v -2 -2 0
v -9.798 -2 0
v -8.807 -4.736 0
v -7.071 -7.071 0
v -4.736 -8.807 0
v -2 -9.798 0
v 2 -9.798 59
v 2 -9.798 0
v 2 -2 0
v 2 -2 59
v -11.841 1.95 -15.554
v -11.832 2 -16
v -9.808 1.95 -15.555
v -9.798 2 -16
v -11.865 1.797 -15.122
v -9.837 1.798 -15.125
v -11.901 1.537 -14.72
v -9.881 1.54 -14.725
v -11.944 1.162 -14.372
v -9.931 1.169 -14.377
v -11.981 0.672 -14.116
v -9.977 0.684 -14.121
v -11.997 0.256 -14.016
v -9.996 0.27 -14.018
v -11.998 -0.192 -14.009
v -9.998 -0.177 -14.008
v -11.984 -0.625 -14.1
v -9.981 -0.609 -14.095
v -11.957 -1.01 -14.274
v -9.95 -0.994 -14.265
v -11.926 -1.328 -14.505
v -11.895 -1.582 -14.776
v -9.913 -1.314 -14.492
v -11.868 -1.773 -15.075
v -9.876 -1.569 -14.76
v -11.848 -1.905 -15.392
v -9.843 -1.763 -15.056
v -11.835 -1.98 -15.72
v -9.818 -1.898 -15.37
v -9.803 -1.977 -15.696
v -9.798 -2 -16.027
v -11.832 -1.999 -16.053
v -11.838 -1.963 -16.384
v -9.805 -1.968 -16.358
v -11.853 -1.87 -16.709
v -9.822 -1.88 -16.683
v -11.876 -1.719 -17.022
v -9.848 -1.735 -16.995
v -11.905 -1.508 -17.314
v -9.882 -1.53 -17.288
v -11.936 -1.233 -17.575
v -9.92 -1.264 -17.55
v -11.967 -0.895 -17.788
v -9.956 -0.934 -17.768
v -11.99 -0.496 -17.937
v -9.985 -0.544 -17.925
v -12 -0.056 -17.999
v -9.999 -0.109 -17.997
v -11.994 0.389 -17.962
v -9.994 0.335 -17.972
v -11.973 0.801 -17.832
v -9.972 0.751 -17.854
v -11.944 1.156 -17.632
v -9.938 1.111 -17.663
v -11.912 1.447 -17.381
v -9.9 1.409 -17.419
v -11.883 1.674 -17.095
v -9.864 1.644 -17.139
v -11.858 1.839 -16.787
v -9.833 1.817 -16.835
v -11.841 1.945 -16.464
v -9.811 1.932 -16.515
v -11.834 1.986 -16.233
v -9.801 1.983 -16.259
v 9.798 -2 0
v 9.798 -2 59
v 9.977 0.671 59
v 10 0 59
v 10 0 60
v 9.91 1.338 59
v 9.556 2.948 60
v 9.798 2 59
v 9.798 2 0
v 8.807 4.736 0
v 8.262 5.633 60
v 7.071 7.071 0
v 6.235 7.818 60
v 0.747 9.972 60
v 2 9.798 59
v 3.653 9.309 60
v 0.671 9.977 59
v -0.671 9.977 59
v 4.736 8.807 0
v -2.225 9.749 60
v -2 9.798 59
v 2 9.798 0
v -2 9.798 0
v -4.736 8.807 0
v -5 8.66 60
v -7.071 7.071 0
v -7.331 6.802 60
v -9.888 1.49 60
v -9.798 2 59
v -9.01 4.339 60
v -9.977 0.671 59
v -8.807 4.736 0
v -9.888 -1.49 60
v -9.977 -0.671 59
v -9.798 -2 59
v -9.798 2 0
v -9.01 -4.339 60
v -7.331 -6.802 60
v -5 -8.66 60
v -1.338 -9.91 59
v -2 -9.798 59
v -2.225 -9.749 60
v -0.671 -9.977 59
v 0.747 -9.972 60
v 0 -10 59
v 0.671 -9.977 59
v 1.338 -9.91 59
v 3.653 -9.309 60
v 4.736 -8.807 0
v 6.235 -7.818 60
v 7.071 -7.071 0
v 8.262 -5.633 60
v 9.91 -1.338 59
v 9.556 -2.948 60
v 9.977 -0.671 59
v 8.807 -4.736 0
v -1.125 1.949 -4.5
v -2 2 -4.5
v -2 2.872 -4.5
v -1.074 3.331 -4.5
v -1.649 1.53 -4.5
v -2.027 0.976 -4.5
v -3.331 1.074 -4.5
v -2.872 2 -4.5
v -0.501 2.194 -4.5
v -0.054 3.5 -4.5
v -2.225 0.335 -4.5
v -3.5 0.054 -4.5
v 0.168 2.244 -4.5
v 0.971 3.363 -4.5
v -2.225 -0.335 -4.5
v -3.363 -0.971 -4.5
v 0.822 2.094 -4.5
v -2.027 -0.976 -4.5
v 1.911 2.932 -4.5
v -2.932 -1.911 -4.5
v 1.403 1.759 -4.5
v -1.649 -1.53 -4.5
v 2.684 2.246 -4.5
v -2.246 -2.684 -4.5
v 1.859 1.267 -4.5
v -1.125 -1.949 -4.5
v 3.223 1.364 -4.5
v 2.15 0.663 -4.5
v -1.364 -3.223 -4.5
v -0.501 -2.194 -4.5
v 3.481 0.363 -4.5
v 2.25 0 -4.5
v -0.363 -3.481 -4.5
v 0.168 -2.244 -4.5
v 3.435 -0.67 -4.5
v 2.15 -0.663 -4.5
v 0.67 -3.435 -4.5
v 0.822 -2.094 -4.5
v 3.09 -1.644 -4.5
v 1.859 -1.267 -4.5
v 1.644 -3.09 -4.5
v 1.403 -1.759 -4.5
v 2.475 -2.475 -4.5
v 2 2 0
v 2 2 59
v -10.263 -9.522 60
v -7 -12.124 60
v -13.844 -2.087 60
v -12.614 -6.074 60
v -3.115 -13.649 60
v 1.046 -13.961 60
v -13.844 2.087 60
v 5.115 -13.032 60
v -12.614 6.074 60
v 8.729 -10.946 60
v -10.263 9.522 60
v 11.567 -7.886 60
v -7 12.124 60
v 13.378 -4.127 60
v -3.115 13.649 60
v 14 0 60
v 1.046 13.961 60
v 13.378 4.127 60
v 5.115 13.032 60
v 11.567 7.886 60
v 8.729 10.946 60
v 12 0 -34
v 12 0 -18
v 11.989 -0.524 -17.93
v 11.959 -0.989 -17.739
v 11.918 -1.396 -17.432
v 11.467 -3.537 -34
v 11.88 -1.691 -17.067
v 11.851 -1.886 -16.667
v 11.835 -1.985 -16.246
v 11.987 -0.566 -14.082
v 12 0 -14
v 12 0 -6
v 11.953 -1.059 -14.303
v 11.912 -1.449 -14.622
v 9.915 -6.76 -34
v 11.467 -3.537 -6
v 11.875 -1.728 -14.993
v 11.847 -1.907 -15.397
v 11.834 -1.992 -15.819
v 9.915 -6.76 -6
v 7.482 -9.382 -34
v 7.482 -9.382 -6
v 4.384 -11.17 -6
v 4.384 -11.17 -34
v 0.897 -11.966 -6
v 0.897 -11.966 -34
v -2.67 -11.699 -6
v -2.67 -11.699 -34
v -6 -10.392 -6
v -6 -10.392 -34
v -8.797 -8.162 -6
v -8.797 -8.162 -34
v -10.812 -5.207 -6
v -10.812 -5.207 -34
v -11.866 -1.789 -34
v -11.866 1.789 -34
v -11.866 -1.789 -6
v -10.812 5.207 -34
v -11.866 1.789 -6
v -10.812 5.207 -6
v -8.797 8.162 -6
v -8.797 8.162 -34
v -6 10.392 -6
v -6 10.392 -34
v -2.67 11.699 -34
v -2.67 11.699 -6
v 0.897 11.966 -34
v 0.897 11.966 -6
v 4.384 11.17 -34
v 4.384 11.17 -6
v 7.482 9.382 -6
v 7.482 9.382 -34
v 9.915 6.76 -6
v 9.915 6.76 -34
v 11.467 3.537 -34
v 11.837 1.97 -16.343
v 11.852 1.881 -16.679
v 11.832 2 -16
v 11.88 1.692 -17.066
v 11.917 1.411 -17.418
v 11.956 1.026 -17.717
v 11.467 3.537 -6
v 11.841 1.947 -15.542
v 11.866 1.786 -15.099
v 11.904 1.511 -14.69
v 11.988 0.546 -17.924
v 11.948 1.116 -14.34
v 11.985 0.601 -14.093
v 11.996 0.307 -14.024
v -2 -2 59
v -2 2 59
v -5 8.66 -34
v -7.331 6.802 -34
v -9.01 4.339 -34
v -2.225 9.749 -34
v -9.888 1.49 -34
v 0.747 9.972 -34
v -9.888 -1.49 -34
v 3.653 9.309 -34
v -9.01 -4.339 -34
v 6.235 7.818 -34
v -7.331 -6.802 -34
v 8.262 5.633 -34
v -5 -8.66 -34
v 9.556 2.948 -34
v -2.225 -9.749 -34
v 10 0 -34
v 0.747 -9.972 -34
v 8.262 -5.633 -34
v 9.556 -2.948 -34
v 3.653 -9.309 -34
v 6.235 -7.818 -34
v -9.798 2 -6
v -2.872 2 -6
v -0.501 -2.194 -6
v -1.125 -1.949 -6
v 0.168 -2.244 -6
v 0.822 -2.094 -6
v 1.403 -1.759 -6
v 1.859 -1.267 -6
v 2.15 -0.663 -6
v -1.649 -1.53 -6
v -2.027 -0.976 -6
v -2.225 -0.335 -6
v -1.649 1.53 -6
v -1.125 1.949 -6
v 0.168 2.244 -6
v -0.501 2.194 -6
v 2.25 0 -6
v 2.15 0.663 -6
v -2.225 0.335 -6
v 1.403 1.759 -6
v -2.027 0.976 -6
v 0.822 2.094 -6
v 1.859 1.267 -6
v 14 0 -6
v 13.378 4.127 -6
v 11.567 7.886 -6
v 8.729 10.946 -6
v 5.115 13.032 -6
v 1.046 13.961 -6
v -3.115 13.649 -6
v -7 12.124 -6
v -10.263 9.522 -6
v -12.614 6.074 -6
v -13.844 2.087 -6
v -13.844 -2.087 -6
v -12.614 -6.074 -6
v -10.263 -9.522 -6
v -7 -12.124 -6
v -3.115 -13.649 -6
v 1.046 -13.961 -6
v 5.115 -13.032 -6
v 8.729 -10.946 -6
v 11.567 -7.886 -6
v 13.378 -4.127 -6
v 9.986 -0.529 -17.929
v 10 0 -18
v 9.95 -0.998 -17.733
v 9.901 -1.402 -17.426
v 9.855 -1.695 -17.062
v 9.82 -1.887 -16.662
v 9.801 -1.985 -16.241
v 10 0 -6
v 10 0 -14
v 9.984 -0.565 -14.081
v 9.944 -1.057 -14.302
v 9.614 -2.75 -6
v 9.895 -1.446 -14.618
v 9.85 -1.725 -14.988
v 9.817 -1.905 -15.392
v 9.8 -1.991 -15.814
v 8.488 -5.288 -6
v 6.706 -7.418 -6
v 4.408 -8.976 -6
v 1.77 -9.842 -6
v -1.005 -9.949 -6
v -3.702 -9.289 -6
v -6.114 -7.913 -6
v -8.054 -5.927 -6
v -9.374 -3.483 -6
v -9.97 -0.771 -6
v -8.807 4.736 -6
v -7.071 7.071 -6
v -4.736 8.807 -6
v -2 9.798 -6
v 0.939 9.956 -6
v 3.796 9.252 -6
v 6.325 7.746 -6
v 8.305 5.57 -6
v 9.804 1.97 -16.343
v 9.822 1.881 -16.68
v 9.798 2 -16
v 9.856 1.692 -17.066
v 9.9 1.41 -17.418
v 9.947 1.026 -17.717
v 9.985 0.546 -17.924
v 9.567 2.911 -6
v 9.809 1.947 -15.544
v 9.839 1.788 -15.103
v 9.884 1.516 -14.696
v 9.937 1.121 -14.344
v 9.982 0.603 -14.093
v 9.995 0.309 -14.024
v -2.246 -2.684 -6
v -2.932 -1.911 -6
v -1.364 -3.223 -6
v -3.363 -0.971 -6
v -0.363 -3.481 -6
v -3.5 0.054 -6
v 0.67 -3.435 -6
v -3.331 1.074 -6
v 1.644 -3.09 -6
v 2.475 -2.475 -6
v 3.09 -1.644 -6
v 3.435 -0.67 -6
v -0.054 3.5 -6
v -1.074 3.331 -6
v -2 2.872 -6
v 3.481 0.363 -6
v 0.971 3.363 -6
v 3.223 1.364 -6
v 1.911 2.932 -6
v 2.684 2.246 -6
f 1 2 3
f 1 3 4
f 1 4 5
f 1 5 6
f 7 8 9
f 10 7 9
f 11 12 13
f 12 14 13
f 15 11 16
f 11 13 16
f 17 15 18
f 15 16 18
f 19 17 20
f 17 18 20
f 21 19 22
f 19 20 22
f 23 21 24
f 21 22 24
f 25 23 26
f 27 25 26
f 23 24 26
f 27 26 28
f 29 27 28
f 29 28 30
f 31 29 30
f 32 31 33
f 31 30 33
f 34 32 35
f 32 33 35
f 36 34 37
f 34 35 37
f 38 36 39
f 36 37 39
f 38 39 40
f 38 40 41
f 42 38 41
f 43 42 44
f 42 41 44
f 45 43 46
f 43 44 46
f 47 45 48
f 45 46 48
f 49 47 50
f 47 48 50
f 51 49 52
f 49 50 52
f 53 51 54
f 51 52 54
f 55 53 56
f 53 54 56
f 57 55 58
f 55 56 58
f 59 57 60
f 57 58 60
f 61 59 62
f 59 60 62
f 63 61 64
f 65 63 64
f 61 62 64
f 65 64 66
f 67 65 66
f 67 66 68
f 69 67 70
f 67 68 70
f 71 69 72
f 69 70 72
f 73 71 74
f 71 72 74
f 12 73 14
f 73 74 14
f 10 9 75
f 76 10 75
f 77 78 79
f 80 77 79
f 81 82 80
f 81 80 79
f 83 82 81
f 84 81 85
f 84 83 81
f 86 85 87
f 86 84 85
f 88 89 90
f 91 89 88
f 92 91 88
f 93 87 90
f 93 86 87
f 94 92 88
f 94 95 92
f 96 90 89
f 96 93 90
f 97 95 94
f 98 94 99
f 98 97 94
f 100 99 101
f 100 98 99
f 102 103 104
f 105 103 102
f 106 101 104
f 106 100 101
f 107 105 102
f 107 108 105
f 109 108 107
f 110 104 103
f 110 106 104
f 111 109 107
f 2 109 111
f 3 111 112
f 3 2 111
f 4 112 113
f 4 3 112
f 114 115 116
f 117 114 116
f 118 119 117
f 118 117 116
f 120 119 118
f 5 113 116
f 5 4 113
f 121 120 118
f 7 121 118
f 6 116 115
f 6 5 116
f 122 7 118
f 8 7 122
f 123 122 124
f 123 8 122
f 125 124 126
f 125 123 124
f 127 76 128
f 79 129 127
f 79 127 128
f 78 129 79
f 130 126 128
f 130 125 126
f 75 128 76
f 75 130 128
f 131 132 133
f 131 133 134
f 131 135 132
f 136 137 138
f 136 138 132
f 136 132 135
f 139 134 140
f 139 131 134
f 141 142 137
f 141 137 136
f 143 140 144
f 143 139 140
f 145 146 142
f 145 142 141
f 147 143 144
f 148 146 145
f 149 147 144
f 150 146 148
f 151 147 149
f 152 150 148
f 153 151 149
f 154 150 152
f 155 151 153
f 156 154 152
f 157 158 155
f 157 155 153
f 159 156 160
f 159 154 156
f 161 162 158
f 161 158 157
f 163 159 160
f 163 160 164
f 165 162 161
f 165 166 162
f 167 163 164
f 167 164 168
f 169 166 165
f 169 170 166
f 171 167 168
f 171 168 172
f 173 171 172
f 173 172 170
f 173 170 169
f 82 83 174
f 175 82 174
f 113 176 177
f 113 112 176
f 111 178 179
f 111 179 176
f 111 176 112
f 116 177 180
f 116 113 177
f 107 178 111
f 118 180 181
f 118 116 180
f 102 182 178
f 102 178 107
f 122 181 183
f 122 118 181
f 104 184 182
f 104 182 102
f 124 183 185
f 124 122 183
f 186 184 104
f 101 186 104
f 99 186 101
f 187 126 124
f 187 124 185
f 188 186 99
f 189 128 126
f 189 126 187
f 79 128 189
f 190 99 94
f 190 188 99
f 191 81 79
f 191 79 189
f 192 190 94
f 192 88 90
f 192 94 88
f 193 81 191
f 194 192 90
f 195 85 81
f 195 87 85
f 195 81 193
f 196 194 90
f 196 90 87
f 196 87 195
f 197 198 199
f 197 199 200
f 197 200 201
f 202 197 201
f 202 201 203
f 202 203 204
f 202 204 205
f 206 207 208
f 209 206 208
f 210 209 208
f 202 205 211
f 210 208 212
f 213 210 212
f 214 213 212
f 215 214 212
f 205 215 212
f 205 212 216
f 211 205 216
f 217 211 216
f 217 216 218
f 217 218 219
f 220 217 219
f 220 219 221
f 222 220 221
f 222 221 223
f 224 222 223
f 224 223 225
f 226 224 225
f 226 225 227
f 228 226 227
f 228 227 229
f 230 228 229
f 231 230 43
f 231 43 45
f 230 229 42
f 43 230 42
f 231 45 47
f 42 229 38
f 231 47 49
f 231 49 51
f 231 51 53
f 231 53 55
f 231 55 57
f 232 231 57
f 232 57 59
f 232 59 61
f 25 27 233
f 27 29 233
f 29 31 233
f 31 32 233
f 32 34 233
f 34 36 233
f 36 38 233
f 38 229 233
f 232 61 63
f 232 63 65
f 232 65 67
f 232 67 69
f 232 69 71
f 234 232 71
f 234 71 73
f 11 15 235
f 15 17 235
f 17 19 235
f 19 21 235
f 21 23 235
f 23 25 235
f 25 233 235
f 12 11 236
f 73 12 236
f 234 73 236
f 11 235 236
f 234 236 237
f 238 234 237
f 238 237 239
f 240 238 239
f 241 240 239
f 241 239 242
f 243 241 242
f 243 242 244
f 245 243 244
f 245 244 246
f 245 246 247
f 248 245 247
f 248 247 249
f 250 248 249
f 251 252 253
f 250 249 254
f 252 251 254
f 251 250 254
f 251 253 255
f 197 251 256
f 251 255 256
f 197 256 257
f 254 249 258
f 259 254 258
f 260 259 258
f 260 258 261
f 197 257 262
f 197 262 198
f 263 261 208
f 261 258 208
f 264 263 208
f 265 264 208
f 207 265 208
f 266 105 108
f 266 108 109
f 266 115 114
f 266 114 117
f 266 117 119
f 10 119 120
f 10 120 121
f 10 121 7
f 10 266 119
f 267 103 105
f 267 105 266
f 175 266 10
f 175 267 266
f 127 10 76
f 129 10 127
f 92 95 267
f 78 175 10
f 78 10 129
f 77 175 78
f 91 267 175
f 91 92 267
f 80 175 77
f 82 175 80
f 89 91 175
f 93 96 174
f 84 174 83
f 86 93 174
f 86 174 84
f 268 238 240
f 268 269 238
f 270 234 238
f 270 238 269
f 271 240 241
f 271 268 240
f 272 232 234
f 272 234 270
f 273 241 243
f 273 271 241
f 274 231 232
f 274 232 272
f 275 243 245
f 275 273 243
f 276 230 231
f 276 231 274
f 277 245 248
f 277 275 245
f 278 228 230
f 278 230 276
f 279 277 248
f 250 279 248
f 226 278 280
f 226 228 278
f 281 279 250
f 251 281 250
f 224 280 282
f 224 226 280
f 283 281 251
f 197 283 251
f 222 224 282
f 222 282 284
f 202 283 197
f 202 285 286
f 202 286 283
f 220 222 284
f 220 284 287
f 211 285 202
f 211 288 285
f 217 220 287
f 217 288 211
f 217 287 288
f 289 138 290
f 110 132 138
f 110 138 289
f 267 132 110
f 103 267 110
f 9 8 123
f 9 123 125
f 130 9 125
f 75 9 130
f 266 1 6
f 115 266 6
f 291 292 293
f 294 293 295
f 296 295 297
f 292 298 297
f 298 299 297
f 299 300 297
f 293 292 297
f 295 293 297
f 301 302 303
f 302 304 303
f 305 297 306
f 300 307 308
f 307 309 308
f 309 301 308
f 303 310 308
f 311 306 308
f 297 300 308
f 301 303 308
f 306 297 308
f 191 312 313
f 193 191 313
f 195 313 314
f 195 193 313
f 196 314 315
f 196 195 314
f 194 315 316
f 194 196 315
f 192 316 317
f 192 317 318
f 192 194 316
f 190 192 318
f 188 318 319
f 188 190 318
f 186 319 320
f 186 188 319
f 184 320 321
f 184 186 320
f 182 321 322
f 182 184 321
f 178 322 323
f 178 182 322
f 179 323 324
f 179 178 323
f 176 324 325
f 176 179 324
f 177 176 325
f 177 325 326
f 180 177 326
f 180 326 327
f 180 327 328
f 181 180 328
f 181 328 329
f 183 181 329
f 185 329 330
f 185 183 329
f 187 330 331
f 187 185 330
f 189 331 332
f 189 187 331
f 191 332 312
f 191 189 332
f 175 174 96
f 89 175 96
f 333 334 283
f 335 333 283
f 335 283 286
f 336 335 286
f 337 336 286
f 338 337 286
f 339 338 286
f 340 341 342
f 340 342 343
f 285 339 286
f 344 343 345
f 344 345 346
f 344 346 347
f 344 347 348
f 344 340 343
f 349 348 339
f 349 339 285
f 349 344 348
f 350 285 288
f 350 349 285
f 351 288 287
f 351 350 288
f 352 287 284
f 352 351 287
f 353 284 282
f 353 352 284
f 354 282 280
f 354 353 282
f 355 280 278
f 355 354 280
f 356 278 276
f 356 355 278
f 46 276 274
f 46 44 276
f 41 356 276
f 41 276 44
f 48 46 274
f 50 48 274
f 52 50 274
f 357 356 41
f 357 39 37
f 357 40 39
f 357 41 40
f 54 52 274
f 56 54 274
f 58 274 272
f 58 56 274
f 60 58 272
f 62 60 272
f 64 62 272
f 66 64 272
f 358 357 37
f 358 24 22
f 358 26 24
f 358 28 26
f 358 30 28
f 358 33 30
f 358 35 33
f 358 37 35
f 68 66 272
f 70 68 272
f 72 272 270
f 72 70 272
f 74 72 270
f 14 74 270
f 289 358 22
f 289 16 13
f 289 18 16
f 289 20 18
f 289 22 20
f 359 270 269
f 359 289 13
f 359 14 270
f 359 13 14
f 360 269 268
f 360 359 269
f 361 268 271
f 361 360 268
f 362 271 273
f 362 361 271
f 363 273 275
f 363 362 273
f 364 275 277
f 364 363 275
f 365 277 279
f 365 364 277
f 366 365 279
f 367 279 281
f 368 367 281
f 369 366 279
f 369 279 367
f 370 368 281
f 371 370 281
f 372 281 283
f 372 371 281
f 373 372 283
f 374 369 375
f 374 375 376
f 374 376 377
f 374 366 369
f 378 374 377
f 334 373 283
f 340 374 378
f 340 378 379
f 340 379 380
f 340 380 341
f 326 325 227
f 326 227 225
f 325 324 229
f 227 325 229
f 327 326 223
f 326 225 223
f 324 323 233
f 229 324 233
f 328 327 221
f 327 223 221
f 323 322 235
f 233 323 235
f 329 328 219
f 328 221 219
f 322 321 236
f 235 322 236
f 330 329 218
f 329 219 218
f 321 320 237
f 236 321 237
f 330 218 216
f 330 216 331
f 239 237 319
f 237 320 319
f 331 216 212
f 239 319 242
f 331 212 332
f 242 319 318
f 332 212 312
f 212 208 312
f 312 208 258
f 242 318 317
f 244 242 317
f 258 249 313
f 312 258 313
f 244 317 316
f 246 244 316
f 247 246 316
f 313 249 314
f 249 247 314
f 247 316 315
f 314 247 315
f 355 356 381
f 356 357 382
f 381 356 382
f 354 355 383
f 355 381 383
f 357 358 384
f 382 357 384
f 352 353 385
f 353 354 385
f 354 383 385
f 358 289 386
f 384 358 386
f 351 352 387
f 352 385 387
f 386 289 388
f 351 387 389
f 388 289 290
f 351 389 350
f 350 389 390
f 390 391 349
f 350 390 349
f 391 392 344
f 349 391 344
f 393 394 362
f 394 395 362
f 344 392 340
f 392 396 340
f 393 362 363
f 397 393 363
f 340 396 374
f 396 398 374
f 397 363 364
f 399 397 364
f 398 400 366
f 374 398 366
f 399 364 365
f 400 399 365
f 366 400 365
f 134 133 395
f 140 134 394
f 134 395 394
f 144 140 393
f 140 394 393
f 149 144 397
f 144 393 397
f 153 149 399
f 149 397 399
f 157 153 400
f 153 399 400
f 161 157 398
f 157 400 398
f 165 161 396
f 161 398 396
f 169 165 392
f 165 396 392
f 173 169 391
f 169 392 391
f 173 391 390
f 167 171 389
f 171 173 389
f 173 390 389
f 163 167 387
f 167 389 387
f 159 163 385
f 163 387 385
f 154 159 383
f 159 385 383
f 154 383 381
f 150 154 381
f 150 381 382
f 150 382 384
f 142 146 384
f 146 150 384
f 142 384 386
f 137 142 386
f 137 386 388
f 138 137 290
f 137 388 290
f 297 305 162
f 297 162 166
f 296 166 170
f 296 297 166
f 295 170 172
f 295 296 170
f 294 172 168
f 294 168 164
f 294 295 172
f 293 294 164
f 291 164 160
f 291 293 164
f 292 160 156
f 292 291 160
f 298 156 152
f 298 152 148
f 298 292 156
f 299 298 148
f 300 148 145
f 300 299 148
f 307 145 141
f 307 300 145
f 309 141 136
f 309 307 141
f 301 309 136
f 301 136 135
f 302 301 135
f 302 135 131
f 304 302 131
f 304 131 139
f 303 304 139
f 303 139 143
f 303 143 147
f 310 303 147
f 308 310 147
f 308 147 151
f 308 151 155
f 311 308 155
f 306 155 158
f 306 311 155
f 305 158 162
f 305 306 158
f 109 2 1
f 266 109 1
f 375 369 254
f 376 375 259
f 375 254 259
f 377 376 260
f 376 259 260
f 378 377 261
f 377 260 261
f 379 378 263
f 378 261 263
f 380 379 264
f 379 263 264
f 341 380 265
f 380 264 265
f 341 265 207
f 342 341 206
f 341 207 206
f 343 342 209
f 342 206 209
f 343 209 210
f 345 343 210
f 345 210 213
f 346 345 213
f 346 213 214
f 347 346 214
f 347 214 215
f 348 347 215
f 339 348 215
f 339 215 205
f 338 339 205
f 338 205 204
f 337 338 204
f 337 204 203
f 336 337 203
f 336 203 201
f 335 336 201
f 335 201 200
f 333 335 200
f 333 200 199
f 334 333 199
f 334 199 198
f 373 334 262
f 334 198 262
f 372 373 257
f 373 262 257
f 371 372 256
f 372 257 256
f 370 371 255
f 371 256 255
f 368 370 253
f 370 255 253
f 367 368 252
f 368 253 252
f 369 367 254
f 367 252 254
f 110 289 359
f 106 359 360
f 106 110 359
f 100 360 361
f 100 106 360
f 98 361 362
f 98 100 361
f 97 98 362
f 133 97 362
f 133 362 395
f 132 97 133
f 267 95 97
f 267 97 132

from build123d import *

# Parameters (mm, degrees)
F1_R      = 14
F1_R_2    = 10
F2_DEPTH  = 60
F4_DEPTH  = 59
F6_R      = 14
F7_DEPTH  = 6
F8_R      = 3.5
F8_R_2    = 2.25
F9_DEPTH  = 1.5
F10_R     = 12
F10_R_2   = 10
F11_DEPTH = 28
F12_R     = 2
F13_DEPTH = 12.5
F14_DEPTH = 34.0010001


with BuildPart() as f2:
    # F1 (on face) → F2 (new body)
    with BuildSketch(Plane.XY):
        Circle(F1_R)
        Circle(F1_R_2, mode=Mode.SUBTRACT)
    extrude(amount=F2_DEPTH)

    # F3 (on Top) → F4 (join)
    with BuildSketch(Plane.XY):
        with BuildLine():
            ThreePointArc((2, 9.7979589711), (0, 10), (-2, 9.7979589711))
            Line((-2, 9.7979589711), (-2, 2))
            Line((-2, 2), (-9.7979589711, 2))
            ThreePointArc((-9.7979589711, 2), (-10, 0), (-9.7979589711, -2))
            Line((-9.7979589711, -2), (-2, -2))
            Line((-2, -2), (-2, -9.7979589711))
            ThreePointArc((-2, -9.7979589711), (-1.0050896201, -9.9493615301), (0, -10))
            ThreePointArc((0, -10), (1.0050896201, -9.9493615301), (2, -9.7979589711))
            Line((2, -9.7979589711), (2, -2))
            Line((2, -2), (9.7979589711, -2))
            ThreePointArc((9.7979589711, -2), (10, 0), (9.7979589711, 2))
            Line((9.7979589711, 2), (2, 2))
            Line((2, 2), (2, 9.7979589711))
        make_face()
    extrude(amount=F4_DEPTH)

    # F6 (on Top) → F7 (join)
    with BuildSketch(Plane.XY):
        Circle(F6_R)
        with BuildLine():
            ThreePointArc((-9.7979589711, 2), (-7.0710678119, 7.0710678119), (-2, 9.7979589711))
            Line((-2, 9.7979589711), (-2, 2))
            Line((-2, 2), (-9.7979589711, 2))
        make_face(mode=Mode.SUBTRACT)
    extrude(amount=-F7_DEPTH)

    # F8 (on face) → F9 (cut)
    with BuildSketch(Plane(origin=(0, 0, -6), x_dir=(1, 0, 0), z_dir=(0, 0, -1))):
        Circle(F8_R)
        Circle(F8_R_2, mode=Mode.SUBTRACT)
    extrude(amount=-F9_DEPTH, mode=Mode.SUBTRACT)

    # F10 (on face) → F11 (join)
    with BuildSketch(Plane(origin=(0, 0, -6), x_dir=(1, 0, 0), z_dir=(0, 0, -1))):
        Circle(F10_R)
        Circle(F10_R_2, mode=Mode.SUBTRACT)
    extrude(amount=F11_DEPTH)

    # F12 (on Right) → F13 (cut, symmetric)
    with BuildSketch(Plane.YZ):
        with Locations((0, -16)):
            Circle(F12_R)
    extrude(amount=F13_DEPTH, both=True, mode=Mode.SUBTRACT)

    # F6 (on Top) → F14 (cut, through all)
    with BuildSketch(Plane.XY):
        with BuildLine():
            Line((-2, 2), (-2, 9.7979589711))
            ThreePointArc((-2, 9.7979589711), (-7.0710678119, 7.0710678119), (-9.7979589711, 2))
            Line((-9.7979589711, 2), (-2, 2))
        make_face()
    extrude(amount=-F14_DEPTH, mode=Mode.SUBTRACT)


solid = f2.part
